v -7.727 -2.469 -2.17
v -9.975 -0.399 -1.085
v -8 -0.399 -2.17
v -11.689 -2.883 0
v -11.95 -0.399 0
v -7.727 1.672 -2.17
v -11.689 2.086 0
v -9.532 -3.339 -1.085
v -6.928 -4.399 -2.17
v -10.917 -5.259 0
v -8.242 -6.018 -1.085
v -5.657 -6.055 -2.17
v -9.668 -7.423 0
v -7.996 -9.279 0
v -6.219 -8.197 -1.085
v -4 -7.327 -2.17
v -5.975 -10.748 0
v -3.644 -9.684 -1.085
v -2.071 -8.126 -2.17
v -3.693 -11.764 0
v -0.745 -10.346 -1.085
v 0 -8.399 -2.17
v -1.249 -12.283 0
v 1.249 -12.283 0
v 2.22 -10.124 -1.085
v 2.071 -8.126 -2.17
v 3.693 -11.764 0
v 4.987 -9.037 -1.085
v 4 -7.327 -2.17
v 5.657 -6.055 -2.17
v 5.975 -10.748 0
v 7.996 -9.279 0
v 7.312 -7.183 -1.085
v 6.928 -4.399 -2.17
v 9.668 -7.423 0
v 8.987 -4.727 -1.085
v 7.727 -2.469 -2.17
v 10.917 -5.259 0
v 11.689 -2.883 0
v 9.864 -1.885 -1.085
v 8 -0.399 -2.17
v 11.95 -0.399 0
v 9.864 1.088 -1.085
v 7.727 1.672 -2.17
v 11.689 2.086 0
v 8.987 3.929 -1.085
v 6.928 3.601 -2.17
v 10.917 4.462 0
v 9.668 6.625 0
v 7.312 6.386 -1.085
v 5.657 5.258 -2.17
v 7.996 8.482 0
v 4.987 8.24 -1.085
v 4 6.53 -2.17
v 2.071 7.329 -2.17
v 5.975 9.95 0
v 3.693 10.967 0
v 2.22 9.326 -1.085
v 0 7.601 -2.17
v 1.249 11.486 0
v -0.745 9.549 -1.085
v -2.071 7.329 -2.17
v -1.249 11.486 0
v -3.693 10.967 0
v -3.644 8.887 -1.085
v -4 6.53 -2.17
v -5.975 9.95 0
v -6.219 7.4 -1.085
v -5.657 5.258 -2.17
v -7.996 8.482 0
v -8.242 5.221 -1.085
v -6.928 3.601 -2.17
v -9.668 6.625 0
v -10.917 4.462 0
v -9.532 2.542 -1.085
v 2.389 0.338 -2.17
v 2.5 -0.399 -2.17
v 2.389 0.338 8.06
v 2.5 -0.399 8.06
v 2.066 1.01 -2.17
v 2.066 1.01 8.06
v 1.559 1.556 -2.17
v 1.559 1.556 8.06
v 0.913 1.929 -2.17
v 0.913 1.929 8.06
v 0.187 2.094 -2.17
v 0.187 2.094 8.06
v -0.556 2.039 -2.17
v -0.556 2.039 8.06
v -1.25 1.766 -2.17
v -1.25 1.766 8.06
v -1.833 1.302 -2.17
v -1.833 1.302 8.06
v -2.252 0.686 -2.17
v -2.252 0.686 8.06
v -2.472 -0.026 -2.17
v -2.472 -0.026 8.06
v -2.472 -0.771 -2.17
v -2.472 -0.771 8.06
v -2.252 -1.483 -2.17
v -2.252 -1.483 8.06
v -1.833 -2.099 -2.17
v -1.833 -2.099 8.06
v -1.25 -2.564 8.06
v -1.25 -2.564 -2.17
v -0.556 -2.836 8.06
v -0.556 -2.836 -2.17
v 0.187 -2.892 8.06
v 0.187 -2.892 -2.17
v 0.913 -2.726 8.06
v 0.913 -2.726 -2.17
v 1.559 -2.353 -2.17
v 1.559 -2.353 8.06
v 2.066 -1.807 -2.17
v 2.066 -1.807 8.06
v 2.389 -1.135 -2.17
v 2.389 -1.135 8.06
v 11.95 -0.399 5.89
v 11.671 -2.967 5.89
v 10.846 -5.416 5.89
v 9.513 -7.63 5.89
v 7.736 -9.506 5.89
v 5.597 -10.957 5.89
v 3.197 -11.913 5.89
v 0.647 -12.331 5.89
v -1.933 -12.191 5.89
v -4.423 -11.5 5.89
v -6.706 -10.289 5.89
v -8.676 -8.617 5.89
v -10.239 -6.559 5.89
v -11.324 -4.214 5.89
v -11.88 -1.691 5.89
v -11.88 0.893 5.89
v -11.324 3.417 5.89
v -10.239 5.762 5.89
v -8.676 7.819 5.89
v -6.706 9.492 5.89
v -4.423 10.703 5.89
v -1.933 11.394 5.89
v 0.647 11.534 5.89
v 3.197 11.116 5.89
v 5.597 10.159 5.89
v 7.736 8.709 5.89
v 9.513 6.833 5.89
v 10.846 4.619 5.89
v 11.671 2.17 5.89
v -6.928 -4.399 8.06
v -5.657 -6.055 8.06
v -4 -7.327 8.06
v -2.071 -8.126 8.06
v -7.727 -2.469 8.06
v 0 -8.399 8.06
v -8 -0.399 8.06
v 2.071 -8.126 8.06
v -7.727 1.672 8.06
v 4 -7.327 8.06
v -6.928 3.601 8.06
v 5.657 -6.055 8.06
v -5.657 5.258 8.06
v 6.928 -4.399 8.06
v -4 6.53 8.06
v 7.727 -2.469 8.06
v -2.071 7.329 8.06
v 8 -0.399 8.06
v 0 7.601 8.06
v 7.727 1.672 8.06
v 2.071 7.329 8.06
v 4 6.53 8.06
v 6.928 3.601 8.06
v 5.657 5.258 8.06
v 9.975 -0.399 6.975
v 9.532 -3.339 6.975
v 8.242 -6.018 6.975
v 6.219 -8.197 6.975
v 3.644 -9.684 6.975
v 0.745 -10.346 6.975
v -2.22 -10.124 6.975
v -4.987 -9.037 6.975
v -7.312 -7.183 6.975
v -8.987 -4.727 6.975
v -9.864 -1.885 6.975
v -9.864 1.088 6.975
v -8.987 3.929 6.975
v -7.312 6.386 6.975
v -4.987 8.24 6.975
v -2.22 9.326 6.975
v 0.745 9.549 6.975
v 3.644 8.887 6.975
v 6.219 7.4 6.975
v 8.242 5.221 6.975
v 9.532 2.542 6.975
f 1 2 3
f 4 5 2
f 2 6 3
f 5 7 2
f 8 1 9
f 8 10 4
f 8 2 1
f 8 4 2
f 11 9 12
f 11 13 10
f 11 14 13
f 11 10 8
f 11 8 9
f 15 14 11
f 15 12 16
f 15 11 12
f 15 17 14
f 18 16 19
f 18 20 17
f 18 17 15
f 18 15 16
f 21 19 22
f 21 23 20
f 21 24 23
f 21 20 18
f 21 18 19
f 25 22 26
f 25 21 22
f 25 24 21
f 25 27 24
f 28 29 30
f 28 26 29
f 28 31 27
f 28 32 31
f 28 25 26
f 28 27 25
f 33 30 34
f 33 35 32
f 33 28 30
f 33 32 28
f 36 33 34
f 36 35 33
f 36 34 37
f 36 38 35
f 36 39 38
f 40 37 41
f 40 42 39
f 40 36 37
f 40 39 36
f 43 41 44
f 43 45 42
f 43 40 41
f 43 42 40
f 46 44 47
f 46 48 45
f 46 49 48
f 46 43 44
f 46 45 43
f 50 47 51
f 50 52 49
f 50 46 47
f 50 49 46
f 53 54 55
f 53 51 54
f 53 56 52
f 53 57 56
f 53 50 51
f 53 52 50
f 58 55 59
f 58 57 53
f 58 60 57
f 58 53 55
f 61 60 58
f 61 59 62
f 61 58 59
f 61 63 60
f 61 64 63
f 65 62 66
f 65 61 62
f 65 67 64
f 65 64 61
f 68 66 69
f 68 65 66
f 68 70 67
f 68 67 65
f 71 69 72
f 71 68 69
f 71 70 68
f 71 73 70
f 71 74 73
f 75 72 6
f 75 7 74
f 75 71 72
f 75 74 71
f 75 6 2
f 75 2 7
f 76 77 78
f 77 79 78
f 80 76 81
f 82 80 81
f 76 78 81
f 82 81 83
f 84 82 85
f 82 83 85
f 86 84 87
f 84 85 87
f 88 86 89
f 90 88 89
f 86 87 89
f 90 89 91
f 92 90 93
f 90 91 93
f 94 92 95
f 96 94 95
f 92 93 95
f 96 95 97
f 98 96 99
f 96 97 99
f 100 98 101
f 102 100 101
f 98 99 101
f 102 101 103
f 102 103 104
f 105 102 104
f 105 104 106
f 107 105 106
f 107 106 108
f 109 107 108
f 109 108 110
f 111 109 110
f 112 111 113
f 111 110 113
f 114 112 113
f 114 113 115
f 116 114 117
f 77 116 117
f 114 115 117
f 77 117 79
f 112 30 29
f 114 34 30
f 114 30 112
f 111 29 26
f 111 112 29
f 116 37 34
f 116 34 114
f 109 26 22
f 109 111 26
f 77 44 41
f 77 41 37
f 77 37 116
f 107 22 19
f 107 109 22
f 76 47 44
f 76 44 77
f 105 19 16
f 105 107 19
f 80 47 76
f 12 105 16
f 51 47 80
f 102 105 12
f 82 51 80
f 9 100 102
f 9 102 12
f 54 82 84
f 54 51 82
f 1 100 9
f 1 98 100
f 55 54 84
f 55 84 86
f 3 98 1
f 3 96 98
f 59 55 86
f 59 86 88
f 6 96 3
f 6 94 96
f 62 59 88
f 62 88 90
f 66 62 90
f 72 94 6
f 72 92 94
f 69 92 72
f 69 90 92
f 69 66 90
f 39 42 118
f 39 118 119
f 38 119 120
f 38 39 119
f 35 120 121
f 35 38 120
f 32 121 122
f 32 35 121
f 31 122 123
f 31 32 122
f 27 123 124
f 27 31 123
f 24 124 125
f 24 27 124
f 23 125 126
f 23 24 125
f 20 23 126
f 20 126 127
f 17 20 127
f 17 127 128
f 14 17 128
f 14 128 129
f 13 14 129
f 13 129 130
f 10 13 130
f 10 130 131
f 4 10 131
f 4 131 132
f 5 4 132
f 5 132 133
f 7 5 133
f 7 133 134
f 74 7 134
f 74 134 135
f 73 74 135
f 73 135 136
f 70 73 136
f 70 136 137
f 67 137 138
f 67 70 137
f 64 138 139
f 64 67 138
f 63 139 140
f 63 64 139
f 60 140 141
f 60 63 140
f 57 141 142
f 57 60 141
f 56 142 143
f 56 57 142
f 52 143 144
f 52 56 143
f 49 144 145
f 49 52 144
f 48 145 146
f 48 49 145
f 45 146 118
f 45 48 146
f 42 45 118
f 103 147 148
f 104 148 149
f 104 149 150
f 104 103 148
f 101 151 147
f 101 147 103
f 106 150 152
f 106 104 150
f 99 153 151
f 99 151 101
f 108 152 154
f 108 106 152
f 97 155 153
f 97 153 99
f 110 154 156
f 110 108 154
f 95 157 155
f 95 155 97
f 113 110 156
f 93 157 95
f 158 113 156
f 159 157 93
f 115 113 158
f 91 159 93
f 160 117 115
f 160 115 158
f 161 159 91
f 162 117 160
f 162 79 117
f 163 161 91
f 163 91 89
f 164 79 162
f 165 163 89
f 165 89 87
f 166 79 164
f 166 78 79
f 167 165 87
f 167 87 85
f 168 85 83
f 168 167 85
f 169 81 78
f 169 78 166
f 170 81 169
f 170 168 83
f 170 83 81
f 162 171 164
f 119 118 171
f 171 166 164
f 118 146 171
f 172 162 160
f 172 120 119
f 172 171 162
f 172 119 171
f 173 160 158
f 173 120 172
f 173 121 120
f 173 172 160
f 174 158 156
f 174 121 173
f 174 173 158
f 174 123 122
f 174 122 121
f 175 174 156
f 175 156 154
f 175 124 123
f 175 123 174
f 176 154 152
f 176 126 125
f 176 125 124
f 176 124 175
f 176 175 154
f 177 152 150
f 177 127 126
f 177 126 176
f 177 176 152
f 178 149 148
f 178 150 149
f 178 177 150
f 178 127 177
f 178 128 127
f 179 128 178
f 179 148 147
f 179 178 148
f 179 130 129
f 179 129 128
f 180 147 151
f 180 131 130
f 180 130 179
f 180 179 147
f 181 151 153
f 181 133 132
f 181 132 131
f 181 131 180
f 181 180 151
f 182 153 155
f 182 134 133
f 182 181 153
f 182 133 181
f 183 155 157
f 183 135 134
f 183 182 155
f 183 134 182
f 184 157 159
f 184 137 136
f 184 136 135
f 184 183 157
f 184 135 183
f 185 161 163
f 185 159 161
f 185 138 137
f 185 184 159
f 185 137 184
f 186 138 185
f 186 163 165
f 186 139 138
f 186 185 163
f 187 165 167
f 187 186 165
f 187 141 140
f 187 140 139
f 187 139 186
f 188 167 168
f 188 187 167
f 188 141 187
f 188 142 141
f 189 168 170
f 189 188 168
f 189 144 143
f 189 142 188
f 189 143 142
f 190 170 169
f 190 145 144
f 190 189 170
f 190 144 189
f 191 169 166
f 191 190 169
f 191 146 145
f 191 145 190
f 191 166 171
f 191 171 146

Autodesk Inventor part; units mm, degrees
ref_plane "YZ Plane" through (0, 0, 0) normal (1, 0, 0) x (0, 1, 0)
sketch "Sketch1" plane through (0, 0, 0) normal (0, 0, 1) x (1, 0, 0)
  circle A0 centre (0, -0.3986) radius 11.95
  point P0 (0, 0)
  dimension "d0" = 23.9
extrude "Extrusion1" add sketch "Sketch1" along normal blind 5.89
ref_plane "Work Plane1" through (0, -0.3986, 8.06) normal (0, 0, 1) x (1, 0, 0)
sketch "Sketch2" plane through (0, -0.3986, 8.06) normal (0, 0, 1) x (1, 0, 0)
  circle A0 centre (0, 0) radius 8
  point P0 (0, 0.3986)
  dimension "d4" = 16
sketch "Sketch5" plane through (0, -0.3986, 5.89) normal (0, 0, 1) x (1, 0, 0)
  circle A0 centre (0, 0) radius 11.95
  point P0 (0, 0.3986)
  dimension "d5" = 23.9
loft "Loft1" add profiles "Sketch2", "Sketch5"
ref_plane "Work Plane2" through (0, -0.3986, -2.17) normal (0, 0, -1) x (-1, 0, 0)
sketch "Sketch6" plane through (0, -0.3986, -2.17) normal (0, 0, -1) x (-1, 0, 0)
  circle A0 centre (0, 0) radius 8
  point P0 (0, 0.3986)
  dimension "d11" = 16
sketch "Sketch7" plane through (0, -0.3986, 0) normal (0, 0, -1) x (-1, 0, 0)
  circle A0 centre (0, 0) radius 11.95
  point P0 (0, 0.3986)
  dimension "d12" = 23.9
loft "Loft2" add profiles "Sketch6", "Sketch7"
sketch "Sketch8" plane through (0, -0.3986, 8.06) normal (0, 0, 1) x (1, 0, 0)
  circle A0 centre (0, 0) radius 2.5
  point P0 (0, 0.3986)
  dimension "d17" = 5
extrude "Extrusion2" cut sketch "Sketch8" against normal blind 15
properties part number "RUEDA"
